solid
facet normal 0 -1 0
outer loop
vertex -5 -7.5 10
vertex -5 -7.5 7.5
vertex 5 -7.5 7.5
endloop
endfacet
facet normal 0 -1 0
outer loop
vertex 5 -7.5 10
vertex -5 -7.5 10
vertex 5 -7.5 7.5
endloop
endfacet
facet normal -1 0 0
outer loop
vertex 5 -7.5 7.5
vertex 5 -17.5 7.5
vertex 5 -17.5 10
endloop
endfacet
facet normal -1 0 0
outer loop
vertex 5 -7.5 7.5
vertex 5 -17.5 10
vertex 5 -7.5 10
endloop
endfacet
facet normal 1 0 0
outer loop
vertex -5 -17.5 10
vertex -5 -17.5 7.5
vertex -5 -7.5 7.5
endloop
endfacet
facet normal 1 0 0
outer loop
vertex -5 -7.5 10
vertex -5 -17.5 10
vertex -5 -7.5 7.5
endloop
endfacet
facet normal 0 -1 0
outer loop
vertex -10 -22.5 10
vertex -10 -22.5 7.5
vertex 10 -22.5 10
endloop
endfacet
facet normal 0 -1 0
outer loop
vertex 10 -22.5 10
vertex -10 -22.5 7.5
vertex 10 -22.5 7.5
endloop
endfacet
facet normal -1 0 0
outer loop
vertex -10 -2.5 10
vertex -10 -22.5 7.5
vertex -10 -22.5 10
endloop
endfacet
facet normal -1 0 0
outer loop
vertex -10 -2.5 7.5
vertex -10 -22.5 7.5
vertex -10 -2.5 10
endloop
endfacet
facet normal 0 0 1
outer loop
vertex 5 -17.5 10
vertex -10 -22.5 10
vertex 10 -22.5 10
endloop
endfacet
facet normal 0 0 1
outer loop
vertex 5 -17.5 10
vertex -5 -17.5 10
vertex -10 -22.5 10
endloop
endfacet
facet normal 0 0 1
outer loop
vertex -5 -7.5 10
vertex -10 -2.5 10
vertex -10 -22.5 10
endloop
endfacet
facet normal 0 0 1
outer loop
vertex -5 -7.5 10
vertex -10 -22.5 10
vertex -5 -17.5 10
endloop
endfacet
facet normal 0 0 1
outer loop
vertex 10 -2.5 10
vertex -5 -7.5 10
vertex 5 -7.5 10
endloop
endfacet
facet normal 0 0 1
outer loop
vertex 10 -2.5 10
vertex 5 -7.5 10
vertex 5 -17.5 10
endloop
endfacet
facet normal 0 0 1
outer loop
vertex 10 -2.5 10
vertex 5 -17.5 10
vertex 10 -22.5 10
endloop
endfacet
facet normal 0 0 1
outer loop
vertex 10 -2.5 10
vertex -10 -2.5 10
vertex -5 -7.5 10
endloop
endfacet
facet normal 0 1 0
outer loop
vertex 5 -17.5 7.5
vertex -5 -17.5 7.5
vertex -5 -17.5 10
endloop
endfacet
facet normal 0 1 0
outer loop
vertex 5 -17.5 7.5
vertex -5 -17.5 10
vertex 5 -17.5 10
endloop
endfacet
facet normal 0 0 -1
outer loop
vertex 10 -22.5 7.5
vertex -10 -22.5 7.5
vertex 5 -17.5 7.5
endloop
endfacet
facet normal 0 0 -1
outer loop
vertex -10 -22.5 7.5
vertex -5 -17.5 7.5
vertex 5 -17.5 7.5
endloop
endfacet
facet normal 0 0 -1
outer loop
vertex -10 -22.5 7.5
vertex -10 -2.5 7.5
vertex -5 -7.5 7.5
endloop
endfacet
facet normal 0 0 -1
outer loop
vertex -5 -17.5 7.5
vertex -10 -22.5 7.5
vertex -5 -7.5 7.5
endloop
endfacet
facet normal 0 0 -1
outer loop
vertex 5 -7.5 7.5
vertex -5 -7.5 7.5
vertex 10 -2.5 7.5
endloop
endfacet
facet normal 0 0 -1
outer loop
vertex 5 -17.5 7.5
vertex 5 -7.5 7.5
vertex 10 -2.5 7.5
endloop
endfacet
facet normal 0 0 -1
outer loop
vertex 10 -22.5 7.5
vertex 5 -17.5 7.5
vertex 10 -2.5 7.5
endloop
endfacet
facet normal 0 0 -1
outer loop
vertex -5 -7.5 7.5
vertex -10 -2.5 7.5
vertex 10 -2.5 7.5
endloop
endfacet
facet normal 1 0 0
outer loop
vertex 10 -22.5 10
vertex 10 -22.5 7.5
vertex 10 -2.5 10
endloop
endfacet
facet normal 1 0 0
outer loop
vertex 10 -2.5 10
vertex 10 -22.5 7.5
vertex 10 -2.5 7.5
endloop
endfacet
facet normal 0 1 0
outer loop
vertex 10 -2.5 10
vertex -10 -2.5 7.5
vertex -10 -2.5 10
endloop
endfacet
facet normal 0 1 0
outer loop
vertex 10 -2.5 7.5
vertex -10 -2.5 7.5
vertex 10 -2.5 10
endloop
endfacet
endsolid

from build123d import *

# Parameters (mm, degrees)
F0_W     = 20
F0_H     = 20
F0_W_2   = 10
F0_H_2   = 10
F1_DEPTH = 2.5
F2_ANGLE = 90


with BuildPart() as f1:
    # F0 (on Front) → F1 (new body)
    with BuildSketch(Plane.XZ):
        Rectangle(F0_W, F0_H)
        Rectangle(F0_W_2, F0_H_2, mode=Mode.SUBTRACT)
    extrude(amount=F1_DEPTH)


with BuildPart() as f1_1:
    # F2: moved
    add(f1.part.rotate(Axis((0, -2.5, 10), (-1, 0, 0)), F2_ANGLE))


solid = f1_1.part
